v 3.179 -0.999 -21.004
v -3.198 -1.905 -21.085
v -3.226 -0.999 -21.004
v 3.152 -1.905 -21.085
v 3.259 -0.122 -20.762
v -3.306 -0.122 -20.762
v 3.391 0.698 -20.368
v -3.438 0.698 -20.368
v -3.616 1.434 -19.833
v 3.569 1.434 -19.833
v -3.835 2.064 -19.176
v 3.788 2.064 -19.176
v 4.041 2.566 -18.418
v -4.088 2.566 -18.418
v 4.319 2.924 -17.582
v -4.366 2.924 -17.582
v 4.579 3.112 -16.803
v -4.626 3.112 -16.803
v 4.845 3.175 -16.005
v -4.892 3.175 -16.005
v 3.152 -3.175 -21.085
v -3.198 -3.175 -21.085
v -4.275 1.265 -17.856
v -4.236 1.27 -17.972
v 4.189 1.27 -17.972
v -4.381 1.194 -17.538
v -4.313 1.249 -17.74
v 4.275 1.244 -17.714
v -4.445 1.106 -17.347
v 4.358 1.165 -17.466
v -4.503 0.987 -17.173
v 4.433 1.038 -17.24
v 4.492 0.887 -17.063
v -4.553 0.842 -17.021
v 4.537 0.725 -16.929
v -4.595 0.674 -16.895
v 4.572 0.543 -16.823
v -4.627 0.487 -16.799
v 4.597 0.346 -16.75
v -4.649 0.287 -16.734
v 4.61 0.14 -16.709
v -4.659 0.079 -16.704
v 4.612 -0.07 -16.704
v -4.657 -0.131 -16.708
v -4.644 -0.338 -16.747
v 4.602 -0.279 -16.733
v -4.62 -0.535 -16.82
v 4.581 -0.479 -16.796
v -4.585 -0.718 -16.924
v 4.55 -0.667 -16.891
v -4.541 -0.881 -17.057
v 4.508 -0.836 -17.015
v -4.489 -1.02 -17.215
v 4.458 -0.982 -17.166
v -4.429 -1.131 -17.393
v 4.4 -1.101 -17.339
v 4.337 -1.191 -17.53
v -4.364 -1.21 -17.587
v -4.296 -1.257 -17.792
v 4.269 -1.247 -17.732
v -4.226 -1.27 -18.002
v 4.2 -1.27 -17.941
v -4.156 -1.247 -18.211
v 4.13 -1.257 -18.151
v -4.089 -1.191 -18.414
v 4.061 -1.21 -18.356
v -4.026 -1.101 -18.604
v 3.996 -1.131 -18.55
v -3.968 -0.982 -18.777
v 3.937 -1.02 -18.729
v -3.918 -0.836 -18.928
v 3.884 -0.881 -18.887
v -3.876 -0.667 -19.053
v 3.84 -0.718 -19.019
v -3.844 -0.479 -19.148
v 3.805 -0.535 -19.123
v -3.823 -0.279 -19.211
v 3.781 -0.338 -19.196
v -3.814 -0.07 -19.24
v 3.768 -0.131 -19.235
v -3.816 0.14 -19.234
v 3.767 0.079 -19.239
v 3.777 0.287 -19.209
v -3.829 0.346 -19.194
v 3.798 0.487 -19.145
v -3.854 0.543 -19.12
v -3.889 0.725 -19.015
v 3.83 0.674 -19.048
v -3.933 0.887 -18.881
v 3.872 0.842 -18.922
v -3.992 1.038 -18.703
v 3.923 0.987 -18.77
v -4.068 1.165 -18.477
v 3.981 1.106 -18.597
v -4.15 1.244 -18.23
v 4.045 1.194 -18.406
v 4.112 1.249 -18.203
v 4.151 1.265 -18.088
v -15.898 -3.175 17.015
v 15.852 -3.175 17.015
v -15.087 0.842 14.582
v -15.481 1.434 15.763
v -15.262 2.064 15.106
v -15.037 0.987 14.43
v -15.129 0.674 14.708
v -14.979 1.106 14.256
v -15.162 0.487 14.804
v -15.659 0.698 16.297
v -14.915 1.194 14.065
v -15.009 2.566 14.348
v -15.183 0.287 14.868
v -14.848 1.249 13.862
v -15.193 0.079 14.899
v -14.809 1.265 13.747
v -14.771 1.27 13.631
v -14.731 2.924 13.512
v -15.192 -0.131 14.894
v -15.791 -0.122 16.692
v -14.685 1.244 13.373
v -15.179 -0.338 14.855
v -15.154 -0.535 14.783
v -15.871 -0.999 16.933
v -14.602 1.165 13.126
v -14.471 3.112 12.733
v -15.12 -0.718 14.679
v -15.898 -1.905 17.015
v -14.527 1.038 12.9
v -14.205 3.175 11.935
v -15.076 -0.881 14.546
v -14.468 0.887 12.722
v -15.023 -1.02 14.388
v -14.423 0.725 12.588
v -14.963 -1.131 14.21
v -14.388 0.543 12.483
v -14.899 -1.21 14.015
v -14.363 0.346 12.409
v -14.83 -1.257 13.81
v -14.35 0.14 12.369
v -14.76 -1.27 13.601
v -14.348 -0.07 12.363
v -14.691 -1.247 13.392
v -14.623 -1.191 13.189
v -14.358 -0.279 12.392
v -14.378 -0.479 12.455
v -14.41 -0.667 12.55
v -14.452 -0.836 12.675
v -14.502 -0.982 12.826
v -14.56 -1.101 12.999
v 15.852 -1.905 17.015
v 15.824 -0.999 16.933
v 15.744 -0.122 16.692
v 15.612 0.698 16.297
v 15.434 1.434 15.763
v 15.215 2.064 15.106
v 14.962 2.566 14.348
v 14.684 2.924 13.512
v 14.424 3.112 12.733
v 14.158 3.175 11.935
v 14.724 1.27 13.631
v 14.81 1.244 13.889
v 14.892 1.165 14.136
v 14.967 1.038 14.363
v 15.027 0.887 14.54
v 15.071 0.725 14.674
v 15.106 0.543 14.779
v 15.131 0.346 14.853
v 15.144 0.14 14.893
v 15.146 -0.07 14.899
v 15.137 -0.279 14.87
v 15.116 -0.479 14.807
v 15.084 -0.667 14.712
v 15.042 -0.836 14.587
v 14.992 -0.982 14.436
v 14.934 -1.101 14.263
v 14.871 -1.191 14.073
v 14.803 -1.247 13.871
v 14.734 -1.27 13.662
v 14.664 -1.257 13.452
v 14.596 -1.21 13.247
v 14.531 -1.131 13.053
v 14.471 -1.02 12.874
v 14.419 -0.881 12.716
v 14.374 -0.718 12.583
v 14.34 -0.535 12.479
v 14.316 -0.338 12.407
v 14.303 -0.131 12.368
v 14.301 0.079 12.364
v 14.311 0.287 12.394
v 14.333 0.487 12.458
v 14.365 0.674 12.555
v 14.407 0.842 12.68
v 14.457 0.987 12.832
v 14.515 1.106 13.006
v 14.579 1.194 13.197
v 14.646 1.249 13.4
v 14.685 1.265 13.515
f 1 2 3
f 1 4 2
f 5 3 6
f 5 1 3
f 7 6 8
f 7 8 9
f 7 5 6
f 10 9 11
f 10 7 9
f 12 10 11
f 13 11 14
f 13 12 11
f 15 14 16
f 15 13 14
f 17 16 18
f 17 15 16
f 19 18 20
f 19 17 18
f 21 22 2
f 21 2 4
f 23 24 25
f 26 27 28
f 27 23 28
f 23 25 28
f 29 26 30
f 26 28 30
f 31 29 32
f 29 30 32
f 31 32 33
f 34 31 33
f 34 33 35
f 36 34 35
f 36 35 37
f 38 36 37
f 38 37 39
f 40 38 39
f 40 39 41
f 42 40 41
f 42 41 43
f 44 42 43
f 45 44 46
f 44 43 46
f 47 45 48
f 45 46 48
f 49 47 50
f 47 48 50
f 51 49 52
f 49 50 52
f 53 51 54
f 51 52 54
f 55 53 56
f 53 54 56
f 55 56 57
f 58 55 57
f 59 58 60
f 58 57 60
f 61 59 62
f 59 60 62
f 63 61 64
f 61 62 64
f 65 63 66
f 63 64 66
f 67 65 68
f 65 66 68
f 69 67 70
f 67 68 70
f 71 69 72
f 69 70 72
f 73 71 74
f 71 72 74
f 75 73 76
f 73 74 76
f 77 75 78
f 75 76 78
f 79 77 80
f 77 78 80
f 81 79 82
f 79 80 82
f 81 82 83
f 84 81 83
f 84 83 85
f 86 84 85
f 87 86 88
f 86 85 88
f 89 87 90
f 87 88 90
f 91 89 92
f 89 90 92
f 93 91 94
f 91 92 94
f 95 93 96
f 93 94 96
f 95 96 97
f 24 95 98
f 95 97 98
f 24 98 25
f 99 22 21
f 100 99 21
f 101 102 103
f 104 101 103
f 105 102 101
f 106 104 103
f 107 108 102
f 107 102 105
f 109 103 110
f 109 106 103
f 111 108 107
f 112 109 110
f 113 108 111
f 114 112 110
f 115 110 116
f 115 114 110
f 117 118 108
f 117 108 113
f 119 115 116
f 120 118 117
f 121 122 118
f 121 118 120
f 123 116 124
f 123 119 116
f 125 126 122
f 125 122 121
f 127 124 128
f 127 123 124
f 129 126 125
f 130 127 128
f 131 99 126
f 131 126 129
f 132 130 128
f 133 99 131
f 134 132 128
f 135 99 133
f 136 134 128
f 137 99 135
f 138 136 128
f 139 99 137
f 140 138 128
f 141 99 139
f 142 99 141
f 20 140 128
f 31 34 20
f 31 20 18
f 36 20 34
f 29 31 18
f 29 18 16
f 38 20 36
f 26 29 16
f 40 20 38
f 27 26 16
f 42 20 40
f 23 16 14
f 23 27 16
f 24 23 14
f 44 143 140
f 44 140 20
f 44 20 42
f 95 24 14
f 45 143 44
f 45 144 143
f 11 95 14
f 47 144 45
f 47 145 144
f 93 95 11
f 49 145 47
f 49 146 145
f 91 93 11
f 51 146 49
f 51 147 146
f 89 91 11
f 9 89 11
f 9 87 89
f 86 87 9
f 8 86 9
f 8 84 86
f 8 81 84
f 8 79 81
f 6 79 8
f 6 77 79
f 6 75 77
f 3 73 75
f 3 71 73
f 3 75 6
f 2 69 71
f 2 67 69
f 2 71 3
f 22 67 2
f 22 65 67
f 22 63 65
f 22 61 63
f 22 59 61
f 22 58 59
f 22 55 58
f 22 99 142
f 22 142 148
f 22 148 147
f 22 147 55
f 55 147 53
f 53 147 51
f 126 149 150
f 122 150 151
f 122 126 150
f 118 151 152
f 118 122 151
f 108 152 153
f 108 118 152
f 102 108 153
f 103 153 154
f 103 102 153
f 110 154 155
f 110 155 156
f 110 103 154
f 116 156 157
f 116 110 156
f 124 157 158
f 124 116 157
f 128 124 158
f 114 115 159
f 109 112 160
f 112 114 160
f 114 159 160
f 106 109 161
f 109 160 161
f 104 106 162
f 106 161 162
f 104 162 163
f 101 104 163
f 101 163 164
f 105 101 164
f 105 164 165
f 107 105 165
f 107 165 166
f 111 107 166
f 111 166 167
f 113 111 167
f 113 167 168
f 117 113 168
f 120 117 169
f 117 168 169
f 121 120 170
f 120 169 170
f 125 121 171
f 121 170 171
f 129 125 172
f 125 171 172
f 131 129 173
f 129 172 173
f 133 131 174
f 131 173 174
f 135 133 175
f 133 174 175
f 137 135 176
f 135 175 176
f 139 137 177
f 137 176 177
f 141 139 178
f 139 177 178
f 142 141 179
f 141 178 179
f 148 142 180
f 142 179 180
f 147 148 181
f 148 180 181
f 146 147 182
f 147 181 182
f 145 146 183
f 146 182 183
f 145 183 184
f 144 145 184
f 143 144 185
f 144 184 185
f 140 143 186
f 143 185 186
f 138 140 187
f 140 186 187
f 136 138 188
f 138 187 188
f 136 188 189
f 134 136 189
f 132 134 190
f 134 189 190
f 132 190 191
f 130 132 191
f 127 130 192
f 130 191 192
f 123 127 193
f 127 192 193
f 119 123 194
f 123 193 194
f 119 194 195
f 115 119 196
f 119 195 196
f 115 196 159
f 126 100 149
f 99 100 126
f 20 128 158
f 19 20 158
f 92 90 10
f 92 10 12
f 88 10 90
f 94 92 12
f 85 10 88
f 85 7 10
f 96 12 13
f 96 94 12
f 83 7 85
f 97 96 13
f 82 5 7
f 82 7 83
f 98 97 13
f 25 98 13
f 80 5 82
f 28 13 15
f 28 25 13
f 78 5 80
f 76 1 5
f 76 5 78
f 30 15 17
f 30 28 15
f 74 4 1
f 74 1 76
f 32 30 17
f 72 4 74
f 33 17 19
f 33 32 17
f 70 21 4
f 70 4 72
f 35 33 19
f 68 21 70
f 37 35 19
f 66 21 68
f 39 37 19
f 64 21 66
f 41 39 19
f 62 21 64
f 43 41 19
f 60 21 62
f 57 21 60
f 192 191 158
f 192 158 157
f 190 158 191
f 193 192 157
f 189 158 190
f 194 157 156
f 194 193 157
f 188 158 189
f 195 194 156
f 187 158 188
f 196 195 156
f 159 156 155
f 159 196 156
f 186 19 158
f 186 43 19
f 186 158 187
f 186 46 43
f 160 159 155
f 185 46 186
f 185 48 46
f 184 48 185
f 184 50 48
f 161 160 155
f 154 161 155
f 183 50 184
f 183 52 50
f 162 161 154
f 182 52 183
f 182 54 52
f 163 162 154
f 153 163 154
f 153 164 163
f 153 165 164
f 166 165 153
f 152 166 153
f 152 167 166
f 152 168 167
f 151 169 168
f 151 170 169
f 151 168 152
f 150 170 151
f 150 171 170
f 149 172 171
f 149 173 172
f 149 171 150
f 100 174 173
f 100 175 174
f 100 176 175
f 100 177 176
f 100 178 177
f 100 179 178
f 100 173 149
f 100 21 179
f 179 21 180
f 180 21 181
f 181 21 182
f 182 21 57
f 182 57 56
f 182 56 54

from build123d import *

# Parameters (mm, degrees)
F1_DEPTH = 3.175
F2_R     = 5.08
F3_R     = 1.27
F4_DEPTH = 25.4


with BuildPart() as f1:
    # F0 (on Front) → F1 (new body, symmetric)
    with BuildSketch(Plane.XZ):
        Polygon((15.851528, 17.014947), (-15.898472, 17.014947), (-3.198472, -21.085053), (3.151528, -21.085053), align=None)
    extrude(amount=F1_DEPTH, both=True)

    # F2
    f2_edges = [f1.edges().sort_by_distance(p)[0] for p in [
        (-0.023472, 3.175, 17.014947),
        (-0.023472, 3.175, -21.085053),
    ]]
    fillet(f2_edges, radius=F2_R)

    # F3 (on Right) → F4 (cut, symmetric)
    with BuildSketch(Plane.YZ):
        with Locations((0, 13.631148)):
            Circle(F3_R)
        with Locations((0, -17.971655)):
            Circle(F3_R)
    extrude(amount=F4_DEPTH, both=True, mode=Mode.SUBTRACT)


solid = f1.part
